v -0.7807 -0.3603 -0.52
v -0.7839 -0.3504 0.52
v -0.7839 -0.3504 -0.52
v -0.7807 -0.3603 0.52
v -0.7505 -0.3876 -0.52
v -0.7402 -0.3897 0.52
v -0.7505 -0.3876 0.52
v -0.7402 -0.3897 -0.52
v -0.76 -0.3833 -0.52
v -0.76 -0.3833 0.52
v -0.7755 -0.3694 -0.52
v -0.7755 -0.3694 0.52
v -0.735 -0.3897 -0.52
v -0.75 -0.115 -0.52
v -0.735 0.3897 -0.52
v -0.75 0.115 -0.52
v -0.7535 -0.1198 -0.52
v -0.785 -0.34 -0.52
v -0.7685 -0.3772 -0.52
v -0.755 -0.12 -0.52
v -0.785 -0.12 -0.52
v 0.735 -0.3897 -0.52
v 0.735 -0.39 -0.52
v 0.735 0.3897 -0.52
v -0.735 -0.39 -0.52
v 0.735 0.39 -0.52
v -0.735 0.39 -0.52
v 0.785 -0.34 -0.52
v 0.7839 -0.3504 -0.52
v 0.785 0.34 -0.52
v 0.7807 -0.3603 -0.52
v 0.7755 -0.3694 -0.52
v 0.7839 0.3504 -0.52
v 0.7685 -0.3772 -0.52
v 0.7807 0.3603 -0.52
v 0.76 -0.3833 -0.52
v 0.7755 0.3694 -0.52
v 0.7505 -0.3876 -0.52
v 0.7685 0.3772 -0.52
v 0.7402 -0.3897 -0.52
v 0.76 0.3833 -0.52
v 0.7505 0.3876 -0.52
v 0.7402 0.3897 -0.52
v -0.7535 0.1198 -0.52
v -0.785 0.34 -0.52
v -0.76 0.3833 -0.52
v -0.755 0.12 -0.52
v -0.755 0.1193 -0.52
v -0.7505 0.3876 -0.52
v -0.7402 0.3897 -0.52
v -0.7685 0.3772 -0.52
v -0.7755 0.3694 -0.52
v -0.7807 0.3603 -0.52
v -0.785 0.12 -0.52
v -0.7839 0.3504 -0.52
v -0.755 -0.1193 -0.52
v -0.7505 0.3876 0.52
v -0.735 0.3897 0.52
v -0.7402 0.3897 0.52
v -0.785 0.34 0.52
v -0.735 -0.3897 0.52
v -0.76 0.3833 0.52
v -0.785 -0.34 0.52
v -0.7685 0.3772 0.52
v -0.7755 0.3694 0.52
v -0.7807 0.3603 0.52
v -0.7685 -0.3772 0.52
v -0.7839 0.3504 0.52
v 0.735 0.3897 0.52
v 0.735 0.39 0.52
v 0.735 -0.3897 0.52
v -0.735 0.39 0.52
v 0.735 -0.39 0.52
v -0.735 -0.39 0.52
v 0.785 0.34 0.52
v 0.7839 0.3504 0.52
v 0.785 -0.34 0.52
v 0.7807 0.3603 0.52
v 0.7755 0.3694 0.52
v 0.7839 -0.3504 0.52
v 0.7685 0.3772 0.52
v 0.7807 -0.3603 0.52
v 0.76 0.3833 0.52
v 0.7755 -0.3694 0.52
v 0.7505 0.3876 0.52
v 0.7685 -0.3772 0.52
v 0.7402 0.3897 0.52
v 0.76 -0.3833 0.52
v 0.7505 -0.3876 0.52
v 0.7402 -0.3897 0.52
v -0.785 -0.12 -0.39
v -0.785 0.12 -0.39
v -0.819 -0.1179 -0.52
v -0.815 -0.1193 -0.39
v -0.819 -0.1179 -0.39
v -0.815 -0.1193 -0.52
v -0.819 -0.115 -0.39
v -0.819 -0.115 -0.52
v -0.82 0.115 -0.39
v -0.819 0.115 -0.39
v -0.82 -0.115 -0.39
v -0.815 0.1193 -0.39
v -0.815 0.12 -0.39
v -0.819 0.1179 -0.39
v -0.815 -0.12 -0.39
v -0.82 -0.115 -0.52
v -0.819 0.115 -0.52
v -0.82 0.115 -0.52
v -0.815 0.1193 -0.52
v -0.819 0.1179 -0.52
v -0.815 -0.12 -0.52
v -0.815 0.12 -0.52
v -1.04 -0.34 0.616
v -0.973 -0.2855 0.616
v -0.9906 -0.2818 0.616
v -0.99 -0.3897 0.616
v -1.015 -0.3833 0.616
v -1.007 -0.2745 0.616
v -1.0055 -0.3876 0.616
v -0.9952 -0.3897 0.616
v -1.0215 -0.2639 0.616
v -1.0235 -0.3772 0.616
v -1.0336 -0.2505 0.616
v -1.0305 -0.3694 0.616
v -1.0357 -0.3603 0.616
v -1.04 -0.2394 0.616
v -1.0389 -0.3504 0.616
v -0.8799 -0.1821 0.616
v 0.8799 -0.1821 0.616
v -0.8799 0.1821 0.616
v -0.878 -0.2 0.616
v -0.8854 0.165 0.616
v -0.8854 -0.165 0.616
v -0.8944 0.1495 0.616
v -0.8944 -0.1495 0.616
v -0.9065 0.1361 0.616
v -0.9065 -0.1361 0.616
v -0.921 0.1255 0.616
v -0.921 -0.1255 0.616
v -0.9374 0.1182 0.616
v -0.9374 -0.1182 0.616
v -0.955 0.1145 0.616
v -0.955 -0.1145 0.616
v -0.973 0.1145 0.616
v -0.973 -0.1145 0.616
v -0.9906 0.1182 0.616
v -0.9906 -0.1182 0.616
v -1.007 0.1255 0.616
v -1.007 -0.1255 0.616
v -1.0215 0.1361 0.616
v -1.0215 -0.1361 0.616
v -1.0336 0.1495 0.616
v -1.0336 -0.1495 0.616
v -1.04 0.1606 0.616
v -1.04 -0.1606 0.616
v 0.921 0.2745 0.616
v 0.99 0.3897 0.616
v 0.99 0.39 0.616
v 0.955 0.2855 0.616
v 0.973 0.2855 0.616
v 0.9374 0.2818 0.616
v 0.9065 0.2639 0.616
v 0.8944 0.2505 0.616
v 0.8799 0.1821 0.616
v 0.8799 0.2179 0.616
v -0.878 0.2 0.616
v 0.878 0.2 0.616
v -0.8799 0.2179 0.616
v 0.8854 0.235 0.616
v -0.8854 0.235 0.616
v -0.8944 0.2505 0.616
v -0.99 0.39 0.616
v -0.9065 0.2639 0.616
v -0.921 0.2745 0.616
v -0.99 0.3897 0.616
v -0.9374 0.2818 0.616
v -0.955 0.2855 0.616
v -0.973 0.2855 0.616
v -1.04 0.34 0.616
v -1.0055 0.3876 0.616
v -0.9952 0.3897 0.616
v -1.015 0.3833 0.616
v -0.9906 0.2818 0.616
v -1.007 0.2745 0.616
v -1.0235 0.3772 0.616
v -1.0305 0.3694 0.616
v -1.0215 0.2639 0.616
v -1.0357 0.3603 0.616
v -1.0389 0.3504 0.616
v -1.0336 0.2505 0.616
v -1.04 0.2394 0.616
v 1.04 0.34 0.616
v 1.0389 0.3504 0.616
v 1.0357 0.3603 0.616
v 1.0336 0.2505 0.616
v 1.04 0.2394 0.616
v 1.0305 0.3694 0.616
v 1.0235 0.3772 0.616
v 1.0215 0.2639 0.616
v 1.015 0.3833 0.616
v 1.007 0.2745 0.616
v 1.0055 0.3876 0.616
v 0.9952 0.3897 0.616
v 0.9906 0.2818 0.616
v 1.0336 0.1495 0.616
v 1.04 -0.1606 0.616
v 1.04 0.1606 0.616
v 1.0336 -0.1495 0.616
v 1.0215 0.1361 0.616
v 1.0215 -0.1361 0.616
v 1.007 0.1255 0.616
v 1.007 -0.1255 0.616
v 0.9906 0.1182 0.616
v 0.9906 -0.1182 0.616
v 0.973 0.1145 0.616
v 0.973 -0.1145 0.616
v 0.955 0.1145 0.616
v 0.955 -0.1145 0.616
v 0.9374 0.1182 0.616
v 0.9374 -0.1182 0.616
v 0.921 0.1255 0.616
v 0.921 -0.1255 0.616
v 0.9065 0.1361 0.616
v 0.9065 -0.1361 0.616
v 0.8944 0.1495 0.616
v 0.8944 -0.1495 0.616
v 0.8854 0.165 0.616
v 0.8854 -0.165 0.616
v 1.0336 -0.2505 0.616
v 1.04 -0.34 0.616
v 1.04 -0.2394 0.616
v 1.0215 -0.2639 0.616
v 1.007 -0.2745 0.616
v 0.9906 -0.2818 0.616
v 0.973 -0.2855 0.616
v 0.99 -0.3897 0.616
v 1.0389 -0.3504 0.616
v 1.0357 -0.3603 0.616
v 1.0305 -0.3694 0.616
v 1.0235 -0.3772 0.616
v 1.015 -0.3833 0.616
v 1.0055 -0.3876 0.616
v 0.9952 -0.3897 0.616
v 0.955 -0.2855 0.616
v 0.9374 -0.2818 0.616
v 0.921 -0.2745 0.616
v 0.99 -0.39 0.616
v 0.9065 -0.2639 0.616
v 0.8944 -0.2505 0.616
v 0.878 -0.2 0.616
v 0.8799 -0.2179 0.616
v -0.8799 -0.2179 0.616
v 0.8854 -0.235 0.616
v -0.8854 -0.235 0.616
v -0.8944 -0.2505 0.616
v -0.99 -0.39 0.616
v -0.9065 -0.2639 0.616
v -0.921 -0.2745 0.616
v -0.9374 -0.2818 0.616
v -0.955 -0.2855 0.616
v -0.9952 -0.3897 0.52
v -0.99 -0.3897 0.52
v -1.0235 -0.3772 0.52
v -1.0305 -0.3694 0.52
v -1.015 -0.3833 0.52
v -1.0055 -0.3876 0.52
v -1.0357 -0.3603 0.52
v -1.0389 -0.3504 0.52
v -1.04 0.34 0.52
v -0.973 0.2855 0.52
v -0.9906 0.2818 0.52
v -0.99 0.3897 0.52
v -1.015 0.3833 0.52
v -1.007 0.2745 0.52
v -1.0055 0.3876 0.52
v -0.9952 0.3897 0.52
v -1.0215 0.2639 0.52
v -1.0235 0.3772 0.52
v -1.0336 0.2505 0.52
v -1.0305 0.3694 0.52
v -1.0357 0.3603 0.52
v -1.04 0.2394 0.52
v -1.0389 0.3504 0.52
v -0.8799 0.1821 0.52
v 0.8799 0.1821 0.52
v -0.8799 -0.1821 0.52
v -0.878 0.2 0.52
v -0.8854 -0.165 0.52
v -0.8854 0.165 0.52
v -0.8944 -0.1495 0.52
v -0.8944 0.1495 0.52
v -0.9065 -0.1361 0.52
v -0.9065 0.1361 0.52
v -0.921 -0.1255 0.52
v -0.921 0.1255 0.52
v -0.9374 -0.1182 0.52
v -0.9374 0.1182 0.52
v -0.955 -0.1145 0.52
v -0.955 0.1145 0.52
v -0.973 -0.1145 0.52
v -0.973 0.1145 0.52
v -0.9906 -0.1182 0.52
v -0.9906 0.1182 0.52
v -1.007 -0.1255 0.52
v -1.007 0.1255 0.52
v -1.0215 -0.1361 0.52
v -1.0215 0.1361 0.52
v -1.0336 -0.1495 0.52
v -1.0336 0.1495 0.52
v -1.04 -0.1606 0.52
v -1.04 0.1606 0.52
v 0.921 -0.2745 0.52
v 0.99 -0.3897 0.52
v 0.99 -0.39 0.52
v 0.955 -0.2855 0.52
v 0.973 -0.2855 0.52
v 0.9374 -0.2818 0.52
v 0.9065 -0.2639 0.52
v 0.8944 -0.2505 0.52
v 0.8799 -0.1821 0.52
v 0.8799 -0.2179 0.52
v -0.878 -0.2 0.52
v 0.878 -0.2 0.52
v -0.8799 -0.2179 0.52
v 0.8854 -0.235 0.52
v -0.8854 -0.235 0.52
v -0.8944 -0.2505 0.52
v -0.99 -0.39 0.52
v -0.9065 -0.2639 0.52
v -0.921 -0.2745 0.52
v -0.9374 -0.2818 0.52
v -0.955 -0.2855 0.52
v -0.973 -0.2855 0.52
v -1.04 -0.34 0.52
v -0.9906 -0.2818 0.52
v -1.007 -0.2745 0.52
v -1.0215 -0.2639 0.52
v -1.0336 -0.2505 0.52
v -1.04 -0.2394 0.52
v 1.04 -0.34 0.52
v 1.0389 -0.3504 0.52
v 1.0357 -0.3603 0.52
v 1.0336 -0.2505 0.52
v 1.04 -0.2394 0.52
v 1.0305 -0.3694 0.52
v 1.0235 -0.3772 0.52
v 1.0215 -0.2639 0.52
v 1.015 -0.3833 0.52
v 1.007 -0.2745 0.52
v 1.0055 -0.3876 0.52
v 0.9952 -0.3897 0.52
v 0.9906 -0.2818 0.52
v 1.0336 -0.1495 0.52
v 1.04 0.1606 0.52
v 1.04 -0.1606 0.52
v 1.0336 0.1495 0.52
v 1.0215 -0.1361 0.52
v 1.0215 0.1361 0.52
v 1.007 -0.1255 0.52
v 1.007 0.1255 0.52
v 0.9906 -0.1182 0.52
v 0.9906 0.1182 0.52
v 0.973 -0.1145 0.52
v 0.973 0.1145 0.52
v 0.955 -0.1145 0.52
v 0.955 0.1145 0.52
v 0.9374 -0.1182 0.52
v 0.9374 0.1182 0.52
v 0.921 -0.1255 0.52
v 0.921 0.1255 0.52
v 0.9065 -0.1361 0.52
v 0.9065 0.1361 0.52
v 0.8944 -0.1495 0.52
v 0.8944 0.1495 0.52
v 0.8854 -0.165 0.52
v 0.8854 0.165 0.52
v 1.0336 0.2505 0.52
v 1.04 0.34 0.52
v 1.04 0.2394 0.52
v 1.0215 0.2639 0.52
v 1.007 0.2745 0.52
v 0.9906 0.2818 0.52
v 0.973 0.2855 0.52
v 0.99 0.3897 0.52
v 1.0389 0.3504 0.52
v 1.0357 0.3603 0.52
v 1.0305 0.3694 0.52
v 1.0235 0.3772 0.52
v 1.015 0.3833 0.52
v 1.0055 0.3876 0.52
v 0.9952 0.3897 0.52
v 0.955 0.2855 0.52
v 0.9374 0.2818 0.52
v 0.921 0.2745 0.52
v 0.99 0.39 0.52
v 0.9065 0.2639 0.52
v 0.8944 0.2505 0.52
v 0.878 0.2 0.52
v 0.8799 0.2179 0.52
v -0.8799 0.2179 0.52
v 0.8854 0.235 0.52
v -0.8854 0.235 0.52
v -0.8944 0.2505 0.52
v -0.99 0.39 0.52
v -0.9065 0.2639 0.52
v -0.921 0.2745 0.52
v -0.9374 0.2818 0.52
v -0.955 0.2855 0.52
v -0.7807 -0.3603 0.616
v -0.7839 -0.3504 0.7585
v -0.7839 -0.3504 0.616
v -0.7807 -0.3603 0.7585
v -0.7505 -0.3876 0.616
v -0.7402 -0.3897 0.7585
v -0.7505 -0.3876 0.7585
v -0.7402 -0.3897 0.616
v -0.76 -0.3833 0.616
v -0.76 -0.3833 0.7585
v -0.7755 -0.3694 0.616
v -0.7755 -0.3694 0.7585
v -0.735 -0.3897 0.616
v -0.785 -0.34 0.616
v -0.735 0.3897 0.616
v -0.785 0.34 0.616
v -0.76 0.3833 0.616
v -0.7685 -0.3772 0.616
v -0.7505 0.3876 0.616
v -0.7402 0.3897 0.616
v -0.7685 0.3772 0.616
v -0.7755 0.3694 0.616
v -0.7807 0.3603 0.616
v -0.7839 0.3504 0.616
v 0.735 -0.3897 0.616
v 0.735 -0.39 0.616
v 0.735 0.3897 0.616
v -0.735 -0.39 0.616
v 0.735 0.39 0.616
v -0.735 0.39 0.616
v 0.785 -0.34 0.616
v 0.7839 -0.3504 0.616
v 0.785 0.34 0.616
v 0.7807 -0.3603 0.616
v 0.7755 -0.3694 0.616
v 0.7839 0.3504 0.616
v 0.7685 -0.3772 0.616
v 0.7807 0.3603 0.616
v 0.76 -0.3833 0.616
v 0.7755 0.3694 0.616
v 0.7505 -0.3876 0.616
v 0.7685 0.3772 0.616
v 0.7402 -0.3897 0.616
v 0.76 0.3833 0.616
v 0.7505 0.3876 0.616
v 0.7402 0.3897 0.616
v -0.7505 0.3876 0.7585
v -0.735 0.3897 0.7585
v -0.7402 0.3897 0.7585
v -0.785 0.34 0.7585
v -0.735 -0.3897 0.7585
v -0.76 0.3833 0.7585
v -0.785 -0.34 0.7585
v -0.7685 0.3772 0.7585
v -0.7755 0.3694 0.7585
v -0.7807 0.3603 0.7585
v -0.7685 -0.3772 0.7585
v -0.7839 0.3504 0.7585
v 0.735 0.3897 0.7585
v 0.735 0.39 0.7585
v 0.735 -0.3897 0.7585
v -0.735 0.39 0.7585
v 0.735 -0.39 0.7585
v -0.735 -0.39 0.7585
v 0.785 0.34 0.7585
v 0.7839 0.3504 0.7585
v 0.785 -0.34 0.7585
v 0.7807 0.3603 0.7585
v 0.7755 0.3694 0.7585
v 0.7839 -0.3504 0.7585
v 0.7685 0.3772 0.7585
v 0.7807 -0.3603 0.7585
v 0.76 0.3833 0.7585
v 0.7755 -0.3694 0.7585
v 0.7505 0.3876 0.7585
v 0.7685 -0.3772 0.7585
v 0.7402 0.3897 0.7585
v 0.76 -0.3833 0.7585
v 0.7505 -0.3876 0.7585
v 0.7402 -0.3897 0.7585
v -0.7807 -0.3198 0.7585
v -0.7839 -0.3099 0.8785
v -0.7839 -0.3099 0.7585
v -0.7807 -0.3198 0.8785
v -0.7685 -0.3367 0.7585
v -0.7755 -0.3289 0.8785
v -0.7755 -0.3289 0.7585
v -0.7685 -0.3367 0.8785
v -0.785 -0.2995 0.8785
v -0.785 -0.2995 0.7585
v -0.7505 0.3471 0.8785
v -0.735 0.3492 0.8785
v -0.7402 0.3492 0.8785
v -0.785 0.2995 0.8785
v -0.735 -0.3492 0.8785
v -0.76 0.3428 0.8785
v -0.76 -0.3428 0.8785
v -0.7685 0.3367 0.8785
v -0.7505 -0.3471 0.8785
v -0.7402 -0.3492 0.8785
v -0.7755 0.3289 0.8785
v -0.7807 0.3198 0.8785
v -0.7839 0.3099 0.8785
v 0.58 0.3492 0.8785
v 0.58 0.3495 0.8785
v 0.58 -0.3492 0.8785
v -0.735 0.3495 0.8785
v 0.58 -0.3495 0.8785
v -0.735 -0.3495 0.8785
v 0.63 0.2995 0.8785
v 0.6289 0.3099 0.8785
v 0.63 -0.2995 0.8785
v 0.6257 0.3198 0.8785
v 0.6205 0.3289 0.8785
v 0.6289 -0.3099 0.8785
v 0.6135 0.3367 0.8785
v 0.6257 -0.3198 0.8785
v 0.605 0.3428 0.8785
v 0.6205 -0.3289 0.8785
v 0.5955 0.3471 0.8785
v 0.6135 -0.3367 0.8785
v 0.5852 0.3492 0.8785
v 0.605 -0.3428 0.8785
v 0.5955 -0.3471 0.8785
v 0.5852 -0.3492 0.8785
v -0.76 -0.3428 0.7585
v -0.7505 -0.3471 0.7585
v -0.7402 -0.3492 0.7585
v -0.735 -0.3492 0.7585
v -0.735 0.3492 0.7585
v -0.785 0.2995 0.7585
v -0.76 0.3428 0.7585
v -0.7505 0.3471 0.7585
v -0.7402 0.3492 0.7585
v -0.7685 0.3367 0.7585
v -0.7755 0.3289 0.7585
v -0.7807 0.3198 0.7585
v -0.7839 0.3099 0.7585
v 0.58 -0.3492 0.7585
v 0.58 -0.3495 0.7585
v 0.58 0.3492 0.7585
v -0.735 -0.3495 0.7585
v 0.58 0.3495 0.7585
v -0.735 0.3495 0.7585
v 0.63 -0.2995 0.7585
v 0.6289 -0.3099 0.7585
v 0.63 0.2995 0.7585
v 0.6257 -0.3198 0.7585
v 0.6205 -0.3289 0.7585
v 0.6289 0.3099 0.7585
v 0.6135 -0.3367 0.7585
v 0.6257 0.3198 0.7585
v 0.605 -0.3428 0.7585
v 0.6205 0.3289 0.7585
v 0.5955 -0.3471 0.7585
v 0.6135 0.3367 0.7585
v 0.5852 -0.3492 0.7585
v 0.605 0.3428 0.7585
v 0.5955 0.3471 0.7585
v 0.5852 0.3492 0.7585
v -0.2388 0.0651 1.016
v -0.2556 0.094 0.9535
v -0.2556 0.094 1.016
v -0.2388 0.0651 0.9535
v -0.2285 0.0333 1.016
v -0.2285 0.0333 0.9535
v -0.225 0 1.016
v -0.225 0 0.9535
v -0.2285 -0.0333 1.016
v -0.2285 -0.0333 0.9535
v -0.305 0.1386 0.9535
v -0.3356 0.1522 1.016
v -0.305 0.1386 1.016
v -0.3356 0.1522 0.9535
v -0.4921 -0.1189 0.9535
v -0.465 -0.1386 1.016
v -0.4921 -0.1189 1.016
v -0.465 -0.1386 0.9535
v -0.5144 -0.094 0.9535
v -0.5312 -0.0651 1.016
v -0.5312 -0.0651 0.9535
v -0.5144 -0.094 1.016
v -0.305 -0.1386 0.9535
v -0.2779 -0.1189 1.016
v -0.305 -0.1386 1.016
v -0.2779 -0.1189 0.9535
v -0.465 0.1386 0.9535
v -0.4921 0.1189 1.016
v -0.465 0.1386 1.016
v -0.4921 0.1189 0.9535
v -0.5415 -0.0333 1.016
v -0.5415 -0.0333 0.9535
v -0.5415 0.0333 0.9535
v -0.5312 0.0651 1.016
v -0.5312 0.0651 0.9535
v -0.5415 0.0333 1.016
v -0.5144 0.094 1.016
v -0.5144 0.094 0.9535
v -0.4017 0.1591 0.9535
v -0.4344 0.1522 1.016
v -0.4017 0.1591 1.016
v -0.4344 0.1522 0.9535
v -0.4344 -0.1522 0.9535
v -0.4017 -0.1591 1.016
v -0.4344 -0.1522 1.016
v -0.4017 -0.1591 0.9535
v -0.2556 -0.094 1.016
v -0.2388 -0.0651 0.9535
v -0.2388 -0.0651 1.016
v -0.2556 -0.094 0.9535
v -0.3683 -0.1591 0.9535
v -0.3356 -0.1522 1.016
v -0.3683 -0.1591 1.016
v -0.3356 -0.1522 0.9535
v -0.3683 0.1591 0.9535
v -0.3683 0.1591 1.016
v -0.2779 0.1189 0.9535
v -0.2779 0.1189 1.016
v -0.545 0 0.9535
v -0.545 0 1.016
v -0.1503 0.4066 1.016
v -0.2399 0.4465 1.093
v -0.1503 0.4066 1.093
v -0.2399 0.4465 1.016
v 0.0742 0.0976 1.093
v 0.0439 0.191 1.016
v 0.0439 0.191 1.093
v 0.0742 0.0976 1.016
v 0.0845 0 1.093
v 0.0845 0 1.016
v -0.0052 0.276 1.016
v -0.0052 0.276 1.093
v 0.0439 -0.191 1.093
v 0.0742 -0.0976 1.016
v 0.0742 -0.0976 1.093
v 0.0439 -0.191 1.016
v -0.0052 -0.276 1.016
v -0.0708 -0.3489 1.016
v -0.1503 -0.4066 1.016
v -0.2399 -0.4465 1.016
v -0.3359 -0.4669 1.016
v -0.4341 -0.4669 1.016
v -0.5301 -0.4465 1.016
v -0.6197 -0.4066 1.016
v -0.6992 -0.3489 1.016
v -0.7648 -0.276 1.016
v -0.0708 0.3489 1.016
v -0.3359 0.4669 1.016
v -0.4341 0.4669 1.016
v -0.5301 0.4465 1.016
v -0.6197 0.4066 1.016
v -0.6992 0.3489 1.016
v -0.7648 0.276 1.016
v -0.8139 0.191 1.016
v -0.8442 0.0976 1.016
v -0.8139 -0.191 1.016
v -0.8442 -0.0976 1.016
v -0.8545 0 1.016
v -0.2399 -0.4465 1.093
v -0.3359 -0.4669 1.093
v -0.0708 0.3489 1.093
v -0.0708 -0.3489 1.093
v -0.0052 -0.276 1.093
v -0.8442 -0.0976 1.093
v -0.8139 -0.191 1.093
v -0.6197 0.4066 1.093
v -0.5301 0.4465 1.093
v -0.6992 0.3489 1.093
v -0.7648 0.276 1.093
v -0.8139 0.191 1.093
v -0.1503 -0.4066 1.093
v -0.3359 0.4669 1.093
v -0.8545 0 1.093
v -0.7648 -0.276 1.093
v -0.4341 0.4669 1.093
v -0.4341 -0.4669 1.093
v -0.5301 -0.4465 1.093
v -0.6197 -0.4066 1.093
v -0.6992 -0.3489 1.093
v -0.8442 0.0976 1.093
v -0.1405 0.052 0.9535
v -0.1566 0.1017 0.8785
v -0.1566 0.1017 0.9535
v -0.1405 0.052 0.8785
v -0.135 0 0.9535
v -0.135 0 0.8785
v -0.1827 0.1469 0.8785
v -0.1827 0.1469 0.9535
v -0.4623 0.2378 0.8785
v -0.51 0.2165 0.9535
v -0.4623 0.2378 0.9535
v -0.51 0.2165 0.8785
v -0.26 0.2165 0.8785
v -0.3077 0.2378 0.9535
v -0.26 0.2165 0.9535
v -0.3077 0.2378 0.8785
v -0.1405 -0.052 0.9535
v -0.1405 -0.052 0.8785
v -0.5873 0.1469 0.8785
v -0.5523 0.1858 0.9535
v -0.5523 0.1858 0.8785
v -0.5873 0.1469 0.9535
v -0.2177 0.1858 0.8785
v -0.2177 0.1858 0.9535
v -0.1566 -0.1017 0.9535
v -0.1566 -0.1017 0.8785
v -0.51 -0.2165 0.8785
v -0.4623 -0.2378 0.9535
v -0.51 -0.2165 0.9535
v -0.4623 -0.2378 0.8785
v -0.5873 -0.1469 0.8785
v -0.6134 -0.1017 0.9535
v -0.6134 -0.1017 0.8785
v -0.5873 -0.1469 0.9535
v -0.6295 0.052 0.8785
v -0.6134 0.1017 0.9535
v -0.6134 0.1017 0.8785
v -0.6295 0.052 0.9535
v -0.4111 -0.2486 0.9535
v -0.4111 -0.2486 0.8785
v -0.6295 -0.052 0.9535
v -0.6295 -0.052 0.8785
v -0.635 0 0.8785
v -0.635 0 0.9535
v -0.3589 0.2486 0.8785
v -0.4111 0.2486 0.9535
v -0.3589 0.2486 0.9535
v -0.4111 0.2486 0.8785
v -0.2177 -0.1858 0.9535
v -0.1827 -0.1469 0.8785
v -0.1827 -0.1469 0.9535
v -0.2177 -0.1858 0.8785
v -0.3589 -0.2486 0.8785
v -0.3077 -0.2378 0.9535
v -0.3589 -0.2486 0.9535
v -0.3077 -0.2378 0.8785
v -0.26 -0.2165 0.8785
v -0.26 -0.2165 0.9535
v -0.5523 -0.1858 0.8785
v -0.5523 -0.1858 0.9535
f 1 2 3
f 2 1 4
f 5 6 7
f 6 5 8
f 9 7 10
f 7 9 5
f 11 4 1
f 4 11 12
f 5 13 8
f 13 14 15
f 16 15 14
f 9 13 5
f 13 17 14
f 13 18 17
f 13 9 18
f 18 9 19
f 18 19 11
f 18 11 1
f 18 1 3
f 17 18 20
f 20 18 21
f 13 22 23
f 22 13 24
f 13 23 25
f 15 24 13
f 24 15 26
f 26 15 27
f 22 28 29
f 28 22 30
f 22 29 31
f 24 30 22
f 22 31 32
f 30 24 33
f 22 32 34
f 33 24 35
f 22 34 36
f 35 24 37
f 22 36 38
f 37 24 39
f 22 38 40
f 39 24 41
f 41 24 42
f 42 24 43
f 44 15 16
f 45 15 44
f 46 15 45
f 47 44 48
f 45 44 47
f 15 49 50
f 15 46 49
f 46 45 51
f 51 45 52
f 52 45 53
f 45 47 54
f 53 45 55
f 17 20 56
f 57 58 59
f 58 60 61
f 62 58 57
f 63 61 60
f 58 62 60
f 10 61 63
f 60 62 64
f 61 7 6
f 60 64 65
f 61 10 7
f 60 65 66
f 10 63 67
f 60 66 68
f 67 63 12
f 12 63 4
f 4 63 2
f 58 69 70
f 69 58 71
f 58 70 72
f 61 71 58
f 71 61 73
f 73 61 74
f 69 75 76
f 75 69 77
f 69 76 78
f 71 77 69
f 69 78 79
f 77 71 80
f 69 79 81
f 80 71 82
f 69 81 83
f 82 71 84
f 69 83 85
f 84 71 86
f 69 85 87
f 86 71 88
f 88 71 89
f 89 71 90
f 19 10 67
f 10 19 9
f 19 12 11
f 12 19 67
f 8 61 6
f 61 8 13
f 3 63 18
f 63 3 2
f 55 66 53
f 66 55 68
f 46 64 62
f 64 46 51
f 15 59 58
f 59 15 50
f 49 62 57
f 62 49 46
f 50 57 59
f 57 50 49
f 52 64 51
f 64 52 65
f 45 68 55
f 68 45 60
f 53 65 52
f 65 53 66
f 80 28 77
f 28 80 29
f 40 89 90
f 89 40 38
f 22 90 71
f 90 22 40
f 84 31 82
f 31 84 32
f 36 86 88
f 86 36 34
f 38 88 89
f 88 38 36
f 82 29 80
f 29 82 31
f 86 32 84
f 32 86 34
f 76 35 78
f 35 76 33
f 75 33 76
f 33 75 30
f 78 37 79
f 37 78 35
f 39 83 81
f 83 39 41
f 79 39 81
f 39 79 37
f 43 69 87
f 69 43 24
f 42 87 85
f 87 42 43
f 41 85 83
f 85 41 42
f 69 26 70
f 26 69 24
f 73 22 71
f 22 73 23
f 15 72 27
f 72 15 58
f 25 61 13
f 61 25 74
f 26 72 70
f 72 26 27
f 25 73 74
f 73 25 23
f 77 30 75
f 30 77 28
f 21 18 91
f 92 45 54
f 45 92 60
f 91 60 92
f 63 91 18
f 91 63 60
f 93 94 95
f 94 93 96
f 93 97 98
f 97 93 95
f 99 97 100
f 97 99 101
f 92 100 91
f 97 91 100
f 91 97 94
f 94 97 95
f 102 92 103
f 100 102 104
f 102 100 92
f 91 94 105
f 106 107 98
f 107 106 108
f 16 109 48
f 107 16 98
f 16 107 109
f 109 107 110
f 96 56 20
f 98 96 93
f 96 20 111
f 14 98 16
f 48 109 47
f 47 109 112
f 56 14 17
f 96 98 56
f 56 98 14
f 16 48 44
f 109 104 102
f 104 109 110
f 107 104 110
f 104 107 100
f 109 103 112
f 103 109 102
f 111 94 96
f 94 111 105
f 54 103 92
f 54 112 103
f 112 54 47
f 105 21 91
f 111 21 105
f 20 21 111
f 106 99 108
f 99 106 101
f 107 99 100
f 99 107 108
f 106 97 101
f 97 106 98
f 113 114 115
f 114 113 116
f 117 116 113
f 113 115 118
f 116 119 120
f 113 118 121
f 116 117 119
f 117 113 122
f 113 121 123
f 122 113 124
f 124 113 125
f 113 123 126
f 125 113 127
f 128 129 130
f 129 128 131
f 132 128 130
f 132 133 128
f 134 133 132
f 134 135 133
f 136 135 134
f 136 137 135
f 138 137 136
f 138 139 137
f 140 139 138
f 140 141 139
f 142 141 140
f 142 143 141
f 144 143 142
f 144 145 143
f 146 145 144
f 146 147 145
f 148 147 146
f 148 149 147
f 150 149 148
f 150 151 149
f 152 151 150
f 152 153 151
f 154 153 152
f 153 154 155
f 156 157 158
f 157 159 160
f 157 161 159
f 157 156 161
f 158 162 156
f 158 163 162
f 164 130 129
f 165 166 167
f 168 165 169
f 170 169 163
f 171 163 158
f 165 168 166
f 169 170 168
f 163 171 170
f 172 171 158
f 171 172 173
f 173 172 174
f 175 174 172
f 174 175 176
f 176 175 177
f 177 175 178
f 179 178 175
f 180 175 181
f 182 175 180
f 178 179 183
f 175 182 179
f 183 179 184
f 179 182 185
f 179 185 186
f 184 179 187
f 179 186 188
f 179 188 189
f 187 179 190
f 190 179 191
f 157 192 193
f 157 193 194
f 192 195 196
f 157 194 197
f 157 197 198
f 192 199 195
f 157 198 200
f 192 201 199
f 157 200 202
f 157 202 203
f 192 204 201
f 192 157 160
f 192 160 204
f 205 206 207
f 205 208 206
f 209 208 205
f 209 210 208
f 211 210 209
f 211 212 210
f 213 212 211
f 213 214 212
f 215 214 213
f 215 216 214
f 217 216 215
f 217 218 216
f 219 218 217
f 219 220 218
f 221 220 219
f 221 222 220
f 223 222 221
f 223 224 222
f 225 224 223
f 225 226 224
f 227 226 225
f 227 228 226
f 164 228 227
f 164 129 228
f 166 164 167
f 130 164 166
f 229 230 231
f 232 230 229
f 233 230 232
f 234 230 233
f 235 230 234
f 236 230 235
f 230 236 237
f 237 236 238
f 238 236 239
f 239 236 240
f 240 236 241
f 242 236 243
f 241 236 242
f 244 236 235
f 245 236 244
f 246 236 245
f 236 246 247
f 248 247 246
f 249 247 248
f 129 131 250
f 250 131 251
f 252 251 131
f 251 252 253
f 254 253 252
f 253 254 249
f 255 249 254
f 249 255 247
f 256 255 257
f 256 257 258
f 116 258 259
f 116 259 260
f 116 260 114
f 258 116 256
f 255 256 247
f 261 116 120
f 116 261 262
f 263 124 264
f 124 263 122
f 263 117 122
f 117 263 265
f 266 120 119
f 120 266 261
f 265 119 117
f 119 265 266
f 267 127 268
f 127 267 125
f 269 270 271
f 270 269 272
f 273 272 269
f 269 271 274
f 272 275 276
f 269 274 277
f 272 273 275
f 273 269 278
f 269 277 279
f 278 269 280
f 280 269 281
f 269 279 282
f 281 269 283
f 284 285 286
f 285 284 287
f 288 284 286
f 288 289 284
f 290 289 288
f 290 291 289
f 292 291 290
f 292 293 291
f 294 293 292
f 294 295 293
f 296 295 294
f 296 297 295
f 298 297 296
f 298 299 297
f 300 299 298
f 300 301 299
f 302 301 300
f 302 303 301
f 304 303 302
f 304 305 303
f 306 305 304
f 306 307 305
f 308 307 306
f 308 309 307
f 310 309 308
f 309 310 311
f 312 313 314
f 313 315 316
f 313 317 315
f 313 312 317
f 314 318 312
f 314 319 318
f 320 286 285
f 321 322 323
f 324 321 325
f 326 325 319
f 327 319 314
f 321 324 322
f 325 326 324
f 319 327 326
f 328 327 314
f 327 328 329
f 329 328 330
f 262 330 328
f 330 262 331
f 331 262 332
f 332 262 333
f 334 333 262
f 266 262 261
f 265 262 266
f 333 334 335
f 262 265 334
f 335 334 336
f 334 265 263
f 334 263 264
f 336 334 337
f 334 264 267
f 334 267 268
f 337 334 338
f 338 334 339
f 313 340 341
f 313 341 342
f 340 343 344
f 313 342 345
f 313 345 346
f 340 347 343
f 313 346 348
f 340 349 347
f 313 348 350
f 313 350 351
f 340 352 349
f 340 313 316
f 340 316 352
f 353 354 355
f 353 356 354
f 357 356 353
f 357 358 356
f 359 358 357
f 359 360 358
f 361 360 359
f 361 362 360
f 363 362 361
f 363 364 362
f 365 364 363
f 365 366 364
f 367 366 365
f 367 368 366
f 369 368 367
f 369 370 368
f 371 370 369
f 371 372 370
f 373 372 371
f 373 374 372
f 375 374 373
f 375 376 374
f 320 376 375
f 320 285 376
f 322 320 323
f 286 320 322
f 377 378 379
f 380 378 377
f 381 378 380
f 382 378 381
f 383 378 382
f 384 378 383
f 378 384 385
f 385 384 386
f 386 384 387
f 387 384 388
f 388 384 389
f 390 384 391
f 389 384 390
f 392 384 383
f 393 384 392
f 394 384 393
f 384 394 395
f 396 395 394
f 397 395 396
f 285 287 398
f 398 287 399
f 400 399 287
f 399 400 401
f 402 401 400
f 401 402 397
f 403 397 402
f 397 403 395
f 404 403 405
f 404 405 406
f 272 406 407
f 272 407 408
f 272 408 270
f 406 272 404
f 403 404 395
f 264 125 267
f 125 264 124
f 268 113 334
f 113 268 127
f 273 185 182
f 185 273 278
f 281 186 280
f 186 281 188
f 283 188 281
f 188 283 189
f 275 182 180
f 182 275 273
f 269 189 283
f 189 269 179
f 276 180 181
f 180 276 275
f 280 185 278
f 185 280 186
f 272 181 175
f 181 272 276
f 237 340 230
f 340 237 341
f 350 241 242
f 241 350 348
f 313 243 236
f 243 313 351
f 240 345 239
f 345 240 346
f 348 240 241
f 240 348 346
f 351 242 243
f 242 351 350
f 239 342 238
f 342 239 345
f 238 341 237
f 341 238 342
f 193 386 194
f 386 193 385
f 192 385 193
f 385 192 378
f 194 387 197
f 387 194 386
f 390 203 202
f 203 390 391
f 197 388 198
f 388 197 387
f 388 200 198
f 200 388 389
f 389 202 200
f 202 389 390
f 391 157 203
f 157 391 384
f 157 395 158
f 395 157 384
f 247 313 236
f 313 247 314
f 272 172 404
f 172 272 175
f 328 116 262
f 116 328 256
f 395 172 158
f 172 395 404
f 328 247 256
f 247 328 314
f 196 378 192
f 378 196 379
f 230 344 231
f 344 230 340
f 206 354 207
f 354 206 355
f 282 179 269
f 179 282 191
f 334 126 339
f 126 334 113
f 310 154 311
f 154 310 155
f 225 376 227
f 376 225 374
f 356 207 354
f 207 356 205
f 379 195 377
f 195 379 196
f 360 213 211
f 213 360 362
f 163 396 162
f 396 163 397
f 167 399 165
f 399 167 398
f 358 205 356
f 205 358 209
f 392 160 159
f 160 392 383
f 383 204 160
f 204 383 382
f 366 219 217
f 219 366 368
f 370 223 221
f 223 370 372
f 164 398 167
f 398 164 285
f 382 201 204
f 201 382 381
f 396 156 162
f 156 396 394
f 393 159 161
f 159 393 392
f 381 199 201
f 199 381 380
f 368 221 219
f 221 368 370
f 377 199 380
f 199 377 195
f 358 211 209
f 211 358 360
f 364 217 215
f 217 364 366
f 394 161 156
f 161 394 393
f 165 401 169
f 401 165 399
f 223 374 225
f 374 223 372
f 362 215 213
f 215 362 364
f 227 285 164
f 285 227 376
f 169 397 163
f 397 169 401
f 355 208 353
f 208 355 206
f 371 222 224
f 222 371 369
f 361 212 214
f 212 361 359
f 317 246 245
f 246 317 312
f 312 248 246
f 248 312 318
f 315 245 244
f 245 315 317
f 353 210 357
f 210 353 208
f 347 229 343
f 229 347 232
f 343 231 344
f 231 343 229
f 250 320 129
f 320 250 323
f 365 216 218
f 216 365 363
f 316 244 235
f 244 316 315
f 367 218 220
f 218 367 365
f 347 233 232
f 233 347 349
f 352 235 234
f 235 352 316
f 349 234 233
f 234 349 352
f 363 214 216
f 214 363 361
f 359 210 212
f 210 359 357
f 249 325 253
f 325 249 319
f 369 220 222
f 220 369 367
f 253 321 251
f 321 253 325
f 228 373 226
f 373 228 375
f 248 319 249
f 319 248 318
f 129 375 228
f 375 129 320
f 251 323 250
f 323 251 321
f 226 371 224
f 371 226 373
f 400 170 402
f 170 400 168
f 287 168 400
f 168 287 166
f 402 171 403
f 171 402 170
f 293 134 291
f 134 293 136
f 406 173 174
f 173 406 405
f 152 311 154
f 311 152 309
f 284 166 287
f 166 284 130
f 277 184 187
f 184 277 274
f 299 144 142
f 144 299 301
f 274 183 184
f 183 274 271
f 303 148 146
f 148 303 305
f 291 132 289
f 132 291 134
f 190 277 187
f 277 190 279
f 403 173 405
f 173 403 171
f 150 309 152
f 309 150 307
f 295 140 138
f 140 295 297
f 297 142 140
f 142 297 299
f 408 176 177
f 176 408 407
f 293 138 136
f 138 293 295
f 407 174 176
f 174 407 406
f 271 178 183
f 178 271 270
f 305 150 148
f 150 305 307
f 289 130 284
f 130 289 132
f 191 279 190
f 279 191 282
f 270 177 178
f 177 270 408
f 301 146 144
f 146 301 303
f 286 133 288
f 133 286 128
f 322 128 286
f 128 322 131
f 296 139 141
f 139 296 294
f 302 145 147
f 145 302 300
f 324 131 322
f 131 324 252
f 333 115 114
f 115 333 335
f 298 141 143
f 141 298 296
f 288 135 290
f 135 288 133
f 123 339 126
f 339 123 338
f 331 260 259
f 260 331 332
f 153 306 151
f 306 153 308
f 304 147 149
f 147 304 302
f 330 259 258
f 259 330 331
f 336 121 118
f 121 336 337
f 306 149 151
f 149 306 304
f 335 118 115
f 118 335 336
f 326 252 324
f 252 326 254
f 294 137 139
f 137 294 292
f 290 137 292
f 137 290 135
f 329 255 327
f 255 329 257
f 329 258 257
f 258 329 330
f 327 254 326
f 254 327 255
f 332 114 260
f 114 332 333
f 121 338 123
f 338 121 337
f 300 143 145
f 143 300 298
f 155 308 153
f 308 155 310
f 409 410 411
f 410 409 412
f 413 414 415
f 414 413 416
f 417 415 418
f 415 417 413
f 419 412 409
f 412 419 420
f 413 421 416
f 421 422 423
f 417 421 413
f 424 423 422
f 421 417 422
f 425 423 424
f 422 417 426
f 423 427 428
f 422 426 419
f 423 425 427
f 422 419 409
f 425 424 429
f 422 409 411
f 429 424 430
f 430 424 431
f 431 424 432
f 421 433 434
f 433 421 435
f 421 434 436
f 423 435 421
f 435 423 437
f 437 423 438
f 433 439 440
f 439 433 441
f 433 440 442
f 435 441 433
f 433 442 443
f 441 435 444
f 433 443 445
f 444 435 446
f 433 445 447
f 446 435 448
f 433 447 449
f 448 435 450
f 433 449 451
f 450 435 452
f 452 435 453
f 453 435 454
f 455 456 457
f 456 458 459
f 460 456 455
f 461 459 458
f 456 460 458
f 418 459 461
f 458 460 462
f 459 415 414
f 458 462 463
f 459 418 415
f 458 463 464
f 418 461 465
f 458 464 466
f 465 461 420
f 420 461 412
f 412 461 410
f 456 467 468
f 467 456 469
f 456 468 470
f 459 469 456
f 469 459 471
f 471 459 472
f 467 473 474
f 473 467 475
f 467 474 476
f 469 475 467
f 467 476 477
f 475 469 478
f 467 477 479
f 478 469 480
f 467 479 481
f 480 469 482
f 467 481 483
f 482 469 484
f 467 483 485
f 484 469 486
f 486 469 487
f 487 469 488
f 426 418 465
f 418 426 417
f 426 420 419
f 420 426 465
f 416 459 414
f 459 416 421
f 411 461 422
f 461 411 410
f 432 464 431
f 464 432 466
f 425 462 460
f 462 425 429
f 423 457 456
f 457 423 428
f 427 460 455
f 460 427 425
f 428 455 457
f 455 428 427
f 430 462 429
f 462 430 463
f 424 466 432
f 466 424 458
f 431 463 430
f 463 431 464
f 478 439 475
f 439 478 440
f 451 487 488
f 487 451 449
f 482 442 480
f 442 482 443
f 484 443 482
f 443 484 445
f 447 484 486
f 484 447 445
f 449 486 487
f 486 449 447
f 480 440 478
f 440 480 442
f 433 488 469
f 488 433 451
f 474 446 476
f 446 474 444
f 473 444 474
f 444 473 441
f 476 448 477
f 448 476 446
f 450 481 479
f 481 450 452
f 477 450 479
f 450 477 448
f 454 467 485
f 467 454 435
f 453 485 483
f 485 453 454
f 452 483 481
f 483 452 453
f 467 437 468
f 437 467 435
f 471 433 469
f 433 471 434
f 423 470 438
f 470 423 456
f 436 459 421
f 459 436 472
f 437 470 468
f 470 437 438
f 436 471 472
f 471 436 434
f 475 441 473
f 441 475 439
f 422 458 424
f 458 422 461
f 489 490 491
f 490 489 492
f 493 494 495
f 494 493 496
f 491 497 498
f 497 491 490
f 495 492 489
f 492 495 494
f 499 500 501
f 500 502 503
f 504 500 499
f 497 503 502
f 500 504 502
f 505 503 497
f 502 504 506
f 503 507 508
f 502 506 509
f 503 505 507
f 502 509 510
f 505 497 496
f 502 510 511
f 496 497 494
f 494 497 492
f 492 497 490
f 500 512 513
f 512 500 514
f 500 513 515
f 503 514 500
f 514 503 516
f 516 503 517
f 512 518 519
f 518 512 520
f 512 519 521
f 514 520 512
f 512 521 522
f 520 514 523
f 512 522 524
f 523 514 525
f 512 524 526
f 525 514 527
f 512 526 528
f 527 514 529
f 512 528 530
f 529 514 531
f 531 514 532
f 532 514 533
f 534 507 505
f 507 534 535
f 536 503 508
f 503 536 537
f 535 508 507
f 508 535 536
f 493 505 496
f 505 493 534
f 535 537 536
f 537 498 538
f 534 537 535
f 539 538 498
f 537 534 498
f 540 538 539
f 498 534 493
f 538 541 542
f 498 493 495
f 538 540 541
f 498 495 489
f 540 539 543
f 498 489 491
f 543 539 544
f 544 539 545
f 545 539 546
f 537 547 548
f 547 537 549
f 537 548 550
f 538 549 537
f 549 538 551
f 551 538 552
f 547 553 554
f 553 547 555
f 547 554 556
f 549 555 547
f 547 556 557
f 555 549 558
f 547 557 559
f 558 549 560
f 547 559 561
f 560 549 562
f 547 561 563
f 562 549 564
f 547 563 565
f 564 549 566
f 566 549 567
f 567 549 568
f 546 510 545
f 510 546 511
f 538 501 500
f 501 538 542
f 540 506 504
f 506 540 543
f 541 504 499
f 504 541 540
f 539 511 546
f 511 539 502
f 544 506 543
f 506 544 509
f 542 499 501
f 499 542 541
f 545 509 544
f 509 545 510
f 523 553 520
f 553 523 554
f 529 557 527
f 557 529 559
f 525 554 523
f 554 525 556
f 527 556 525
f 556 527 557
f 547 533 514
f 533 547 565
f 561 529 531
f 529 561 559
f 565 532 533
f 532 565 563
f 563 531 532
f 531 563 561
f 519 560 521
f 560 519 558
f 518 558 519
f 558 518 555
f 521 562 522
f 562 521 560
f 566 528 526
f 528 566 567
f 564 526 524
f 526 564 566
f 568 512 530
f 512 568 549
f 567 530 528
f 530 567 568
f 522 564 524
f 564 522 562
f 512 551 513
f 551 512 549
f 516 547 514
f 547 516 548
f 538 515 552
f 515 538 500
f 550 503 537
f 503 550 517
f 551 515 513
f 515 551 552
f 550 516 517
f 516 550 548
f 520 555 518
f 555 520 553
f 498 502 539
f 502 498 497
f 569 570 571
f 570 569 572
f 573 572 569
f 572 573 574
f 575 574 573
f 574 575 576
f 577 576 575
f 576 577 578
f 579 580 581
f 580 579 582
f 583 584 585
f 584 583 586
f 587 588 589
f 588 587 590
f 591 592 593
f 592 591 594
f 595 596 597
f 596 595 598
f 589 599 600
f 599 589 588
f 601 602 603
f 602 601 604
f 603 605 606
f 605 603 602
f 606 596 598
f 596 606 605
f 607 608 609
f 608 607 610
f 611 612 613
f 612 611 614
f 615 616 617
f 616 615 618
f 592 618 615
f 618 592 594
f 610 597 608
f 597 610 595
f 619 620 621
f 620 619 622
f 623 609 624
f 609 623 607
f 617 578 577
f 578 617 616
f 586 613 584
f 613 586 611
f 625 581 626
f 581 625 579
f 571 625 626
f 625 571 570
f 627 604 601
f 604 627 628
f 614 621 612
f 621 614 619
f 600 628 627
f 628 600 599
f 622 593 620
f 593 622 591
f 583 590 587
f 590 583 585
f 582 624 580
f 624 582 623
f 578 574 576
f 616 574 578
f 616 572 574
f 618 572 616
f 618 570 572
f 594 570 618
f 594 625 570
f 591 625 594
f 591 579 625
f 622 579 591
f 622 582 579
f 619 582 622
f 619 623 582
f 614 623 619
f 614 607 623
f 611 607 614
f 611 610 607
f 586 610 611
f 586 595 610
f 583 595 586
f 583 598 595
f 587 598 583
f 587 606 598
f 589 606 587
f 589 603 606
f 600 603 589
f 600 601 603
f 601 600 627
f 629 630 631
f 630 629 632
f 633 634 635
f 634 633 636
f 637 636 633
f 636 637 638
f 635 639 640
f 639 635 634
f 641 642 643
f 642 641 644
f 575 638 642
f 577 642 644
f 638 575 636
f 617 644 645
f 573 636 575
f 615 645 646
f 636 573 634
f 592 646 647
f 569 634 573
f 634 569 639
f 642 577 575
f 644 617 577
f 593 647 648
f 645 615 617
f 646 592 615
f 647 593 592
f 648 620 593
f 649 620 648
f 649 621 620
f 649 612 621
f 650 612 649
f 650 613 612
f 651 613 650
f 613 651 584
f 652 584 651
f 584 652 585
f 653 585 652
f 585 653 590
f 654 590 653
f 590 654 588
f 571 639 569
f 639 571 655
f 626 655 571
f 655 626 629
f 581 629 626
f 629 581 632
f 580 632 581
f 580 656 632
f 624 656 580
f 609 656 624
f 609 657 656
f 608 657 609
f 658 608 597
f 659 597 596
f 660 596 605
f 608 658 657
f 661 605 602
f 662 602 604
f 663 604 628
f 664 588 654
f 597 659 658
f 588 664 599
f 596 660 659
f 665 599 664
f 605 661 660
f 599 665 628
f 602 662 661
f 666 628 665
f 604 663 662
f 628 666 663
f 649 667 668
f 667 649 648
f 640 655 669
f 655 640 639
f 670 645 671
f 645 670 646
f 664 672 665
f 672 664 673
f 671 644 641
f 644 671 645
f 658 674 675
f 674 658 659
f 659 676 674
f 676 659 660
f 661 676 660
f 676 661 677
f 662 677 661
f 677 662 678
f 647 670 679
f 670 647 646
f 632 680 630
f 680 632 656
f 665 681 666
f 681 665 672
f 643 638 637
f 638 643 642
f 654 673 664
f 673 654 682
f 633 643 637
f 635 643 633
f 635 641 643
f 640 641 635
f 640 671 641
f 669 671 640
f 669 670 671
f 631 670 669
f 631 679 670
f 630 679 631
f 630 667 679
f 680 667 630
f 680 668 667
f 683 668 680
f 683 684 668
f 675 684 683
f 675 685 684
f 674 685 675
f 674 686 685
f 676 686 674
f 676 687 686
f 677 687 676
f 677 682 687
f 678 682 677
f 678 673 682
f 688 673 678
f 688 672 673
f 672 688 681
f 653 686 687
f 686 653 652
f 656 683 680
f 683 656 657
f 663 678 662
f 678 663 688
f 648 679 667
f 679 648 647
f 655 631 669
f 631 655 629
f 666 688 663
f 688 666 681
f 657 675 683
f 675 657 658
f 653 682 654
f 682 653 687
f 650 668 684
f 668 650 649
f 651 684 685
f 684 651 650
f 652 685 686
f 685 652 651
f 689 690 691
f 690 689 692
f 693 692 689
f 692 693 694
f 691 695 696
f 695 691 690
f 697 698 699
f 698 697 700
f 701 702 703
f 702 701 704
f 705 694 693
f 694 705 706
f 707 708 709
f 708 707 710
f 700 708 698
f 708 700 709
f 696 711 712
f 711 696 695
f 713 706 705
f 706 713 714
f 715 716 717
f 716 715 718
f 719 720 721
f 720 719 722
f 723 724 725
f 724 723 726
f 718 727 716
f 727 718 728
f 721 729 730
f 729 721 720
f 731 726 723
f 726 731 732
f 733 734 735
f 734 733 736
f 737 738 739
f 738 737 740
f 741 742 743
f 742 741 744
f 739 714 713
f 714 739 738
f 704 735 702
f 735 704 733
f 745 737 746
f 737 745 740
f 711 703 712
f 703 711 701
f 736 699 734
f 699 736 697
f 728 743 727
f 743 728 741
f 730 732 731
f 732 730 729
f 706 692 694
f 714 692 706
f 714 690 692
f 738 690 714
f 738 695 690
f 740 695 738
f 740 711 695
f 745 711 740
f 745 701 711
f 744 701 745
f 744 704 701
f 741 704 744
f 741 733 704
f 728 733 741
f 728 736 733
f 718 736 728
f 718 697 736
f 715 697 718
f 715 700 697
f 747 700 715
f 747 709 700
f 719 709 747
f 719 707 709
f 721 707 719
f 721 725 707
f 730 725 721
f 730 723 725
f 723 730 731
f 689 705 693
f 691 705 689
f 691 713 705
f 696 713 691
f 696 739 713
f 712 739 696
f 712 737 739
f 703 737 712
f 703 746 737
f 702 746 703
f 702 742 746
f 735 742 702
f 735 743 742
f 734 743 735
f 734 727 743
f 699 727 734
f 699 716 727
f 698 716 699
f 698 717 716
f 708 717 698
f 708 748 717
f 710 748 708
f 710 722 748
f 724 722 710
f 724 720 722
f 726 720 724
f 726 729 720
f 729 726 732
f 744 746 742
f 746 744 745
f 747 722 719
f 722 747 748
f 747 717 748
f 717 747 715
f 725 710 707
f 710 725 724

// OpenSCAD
 use <MCAD/boxes.scad>

servo_width = 1.57;
servo_depth = 0.78;
base_height = 1.04;
top_height = 0.65;
screws_distance_depth = 0.40;
screws_distance_width = 1.88;
screw_width=0.172;
ears_width = 2.08;
ears_height = 0.096;
ears_top_height = 0.1425;
round_top_depth = 0.6990;
round_top_width = 1.415;
round_top_height = 0.12;
rounded = .05;
top_cylinder_height=0.0750;
top_cylinder_radius=0.25;
top_cylinder_offset = 0.65-top_cylinder_radius;
wheel_inner_cylinder_height = 0.20-top_cylinder_height;
wheel_height=0.077;
wheel_radius=0.9390/2.0;

cable_box_width = 0.07;
cable_box_depth = 0.24;
cable_box_height = 0.13;


$fs=0.01;


module hs311_screw(){
	cylinder(h=2*ears_height, r=screw_width/2.0, center=true);
}

module hs311(position, rotation, screws = 0, axle_lenght = 0)
{
	translate(position)
	{
		rotate(rotation)
	    {
			union()
			{
                //main body
                roundedBox([servo_width,servo_depth,base_height],rounded,true);
				 translate([-servo_width/2.0,0,-base_height/2.0+cable_box_height/2.0]) roundedBox([cable_box_width,cable_box_depth,cable_box_height], rounded/10,true);
                translate([0,0,base_height/2.0 + ears_height /2.0]){
 	                difference(){
                    roundedBox([ears_width, servo_depth, ears_height ],rounded,true);
					union(){

                    translate([(ears_width-screw_width)/2.0+0.01, screws_distance_depth/2.0, 0]) hs311_screw();
                    translate([(ears_width-screw_width)/2.0+0.01, -screws_distance_depth/2.0, 0]) hs311_screw();
                    translate([-(ears_width-screw_width)/2.0-0.01, screws_distance_depth/2.0, 0]) hs311_screw();
                    translate([-(ears_width-screw_width)/2.0-0.01, -screws_distance_depth/2.0, 0]) hs311_screw();
					}
					}


                    
    				translate([ 0,0, ears_height/2.0 + ears_top_height/2.0 ]){
	    	            roundedBox([servo_width,servo_depth, ears_top_height ],rounded,true);
						 translate([0,0,ears_top_height/2.0 + round_top_height/2.0]) {
							translate([(servo_width-round_top_width)/-2,0,0])
                                roundedBox([round_top_width,round_top_depth,round_top_height ],rounded,true);
							translate([-servo_width/2.0+top_cylinder_offset,0,round_top_height/2.0+top_cylinder_height/2.0]){
								cylinder(h=top_cylinder_height,r=top_cylinder_radius,center=true);
								translate([0,0,top_cylinder_height/2.0]) {
									cylinder(h=wheel_inner_cylinder_height,r=0.16);
									  translate([0,0,wheel_inner_cylinder_height/2.0])
                                             cylinder(h=wheel_height,r=wheel_radius);
									}
								}
                        }
					 }
				 }				                
            }
        }
    }
}



module test_hs311(){hs311();}


test_hs311();
